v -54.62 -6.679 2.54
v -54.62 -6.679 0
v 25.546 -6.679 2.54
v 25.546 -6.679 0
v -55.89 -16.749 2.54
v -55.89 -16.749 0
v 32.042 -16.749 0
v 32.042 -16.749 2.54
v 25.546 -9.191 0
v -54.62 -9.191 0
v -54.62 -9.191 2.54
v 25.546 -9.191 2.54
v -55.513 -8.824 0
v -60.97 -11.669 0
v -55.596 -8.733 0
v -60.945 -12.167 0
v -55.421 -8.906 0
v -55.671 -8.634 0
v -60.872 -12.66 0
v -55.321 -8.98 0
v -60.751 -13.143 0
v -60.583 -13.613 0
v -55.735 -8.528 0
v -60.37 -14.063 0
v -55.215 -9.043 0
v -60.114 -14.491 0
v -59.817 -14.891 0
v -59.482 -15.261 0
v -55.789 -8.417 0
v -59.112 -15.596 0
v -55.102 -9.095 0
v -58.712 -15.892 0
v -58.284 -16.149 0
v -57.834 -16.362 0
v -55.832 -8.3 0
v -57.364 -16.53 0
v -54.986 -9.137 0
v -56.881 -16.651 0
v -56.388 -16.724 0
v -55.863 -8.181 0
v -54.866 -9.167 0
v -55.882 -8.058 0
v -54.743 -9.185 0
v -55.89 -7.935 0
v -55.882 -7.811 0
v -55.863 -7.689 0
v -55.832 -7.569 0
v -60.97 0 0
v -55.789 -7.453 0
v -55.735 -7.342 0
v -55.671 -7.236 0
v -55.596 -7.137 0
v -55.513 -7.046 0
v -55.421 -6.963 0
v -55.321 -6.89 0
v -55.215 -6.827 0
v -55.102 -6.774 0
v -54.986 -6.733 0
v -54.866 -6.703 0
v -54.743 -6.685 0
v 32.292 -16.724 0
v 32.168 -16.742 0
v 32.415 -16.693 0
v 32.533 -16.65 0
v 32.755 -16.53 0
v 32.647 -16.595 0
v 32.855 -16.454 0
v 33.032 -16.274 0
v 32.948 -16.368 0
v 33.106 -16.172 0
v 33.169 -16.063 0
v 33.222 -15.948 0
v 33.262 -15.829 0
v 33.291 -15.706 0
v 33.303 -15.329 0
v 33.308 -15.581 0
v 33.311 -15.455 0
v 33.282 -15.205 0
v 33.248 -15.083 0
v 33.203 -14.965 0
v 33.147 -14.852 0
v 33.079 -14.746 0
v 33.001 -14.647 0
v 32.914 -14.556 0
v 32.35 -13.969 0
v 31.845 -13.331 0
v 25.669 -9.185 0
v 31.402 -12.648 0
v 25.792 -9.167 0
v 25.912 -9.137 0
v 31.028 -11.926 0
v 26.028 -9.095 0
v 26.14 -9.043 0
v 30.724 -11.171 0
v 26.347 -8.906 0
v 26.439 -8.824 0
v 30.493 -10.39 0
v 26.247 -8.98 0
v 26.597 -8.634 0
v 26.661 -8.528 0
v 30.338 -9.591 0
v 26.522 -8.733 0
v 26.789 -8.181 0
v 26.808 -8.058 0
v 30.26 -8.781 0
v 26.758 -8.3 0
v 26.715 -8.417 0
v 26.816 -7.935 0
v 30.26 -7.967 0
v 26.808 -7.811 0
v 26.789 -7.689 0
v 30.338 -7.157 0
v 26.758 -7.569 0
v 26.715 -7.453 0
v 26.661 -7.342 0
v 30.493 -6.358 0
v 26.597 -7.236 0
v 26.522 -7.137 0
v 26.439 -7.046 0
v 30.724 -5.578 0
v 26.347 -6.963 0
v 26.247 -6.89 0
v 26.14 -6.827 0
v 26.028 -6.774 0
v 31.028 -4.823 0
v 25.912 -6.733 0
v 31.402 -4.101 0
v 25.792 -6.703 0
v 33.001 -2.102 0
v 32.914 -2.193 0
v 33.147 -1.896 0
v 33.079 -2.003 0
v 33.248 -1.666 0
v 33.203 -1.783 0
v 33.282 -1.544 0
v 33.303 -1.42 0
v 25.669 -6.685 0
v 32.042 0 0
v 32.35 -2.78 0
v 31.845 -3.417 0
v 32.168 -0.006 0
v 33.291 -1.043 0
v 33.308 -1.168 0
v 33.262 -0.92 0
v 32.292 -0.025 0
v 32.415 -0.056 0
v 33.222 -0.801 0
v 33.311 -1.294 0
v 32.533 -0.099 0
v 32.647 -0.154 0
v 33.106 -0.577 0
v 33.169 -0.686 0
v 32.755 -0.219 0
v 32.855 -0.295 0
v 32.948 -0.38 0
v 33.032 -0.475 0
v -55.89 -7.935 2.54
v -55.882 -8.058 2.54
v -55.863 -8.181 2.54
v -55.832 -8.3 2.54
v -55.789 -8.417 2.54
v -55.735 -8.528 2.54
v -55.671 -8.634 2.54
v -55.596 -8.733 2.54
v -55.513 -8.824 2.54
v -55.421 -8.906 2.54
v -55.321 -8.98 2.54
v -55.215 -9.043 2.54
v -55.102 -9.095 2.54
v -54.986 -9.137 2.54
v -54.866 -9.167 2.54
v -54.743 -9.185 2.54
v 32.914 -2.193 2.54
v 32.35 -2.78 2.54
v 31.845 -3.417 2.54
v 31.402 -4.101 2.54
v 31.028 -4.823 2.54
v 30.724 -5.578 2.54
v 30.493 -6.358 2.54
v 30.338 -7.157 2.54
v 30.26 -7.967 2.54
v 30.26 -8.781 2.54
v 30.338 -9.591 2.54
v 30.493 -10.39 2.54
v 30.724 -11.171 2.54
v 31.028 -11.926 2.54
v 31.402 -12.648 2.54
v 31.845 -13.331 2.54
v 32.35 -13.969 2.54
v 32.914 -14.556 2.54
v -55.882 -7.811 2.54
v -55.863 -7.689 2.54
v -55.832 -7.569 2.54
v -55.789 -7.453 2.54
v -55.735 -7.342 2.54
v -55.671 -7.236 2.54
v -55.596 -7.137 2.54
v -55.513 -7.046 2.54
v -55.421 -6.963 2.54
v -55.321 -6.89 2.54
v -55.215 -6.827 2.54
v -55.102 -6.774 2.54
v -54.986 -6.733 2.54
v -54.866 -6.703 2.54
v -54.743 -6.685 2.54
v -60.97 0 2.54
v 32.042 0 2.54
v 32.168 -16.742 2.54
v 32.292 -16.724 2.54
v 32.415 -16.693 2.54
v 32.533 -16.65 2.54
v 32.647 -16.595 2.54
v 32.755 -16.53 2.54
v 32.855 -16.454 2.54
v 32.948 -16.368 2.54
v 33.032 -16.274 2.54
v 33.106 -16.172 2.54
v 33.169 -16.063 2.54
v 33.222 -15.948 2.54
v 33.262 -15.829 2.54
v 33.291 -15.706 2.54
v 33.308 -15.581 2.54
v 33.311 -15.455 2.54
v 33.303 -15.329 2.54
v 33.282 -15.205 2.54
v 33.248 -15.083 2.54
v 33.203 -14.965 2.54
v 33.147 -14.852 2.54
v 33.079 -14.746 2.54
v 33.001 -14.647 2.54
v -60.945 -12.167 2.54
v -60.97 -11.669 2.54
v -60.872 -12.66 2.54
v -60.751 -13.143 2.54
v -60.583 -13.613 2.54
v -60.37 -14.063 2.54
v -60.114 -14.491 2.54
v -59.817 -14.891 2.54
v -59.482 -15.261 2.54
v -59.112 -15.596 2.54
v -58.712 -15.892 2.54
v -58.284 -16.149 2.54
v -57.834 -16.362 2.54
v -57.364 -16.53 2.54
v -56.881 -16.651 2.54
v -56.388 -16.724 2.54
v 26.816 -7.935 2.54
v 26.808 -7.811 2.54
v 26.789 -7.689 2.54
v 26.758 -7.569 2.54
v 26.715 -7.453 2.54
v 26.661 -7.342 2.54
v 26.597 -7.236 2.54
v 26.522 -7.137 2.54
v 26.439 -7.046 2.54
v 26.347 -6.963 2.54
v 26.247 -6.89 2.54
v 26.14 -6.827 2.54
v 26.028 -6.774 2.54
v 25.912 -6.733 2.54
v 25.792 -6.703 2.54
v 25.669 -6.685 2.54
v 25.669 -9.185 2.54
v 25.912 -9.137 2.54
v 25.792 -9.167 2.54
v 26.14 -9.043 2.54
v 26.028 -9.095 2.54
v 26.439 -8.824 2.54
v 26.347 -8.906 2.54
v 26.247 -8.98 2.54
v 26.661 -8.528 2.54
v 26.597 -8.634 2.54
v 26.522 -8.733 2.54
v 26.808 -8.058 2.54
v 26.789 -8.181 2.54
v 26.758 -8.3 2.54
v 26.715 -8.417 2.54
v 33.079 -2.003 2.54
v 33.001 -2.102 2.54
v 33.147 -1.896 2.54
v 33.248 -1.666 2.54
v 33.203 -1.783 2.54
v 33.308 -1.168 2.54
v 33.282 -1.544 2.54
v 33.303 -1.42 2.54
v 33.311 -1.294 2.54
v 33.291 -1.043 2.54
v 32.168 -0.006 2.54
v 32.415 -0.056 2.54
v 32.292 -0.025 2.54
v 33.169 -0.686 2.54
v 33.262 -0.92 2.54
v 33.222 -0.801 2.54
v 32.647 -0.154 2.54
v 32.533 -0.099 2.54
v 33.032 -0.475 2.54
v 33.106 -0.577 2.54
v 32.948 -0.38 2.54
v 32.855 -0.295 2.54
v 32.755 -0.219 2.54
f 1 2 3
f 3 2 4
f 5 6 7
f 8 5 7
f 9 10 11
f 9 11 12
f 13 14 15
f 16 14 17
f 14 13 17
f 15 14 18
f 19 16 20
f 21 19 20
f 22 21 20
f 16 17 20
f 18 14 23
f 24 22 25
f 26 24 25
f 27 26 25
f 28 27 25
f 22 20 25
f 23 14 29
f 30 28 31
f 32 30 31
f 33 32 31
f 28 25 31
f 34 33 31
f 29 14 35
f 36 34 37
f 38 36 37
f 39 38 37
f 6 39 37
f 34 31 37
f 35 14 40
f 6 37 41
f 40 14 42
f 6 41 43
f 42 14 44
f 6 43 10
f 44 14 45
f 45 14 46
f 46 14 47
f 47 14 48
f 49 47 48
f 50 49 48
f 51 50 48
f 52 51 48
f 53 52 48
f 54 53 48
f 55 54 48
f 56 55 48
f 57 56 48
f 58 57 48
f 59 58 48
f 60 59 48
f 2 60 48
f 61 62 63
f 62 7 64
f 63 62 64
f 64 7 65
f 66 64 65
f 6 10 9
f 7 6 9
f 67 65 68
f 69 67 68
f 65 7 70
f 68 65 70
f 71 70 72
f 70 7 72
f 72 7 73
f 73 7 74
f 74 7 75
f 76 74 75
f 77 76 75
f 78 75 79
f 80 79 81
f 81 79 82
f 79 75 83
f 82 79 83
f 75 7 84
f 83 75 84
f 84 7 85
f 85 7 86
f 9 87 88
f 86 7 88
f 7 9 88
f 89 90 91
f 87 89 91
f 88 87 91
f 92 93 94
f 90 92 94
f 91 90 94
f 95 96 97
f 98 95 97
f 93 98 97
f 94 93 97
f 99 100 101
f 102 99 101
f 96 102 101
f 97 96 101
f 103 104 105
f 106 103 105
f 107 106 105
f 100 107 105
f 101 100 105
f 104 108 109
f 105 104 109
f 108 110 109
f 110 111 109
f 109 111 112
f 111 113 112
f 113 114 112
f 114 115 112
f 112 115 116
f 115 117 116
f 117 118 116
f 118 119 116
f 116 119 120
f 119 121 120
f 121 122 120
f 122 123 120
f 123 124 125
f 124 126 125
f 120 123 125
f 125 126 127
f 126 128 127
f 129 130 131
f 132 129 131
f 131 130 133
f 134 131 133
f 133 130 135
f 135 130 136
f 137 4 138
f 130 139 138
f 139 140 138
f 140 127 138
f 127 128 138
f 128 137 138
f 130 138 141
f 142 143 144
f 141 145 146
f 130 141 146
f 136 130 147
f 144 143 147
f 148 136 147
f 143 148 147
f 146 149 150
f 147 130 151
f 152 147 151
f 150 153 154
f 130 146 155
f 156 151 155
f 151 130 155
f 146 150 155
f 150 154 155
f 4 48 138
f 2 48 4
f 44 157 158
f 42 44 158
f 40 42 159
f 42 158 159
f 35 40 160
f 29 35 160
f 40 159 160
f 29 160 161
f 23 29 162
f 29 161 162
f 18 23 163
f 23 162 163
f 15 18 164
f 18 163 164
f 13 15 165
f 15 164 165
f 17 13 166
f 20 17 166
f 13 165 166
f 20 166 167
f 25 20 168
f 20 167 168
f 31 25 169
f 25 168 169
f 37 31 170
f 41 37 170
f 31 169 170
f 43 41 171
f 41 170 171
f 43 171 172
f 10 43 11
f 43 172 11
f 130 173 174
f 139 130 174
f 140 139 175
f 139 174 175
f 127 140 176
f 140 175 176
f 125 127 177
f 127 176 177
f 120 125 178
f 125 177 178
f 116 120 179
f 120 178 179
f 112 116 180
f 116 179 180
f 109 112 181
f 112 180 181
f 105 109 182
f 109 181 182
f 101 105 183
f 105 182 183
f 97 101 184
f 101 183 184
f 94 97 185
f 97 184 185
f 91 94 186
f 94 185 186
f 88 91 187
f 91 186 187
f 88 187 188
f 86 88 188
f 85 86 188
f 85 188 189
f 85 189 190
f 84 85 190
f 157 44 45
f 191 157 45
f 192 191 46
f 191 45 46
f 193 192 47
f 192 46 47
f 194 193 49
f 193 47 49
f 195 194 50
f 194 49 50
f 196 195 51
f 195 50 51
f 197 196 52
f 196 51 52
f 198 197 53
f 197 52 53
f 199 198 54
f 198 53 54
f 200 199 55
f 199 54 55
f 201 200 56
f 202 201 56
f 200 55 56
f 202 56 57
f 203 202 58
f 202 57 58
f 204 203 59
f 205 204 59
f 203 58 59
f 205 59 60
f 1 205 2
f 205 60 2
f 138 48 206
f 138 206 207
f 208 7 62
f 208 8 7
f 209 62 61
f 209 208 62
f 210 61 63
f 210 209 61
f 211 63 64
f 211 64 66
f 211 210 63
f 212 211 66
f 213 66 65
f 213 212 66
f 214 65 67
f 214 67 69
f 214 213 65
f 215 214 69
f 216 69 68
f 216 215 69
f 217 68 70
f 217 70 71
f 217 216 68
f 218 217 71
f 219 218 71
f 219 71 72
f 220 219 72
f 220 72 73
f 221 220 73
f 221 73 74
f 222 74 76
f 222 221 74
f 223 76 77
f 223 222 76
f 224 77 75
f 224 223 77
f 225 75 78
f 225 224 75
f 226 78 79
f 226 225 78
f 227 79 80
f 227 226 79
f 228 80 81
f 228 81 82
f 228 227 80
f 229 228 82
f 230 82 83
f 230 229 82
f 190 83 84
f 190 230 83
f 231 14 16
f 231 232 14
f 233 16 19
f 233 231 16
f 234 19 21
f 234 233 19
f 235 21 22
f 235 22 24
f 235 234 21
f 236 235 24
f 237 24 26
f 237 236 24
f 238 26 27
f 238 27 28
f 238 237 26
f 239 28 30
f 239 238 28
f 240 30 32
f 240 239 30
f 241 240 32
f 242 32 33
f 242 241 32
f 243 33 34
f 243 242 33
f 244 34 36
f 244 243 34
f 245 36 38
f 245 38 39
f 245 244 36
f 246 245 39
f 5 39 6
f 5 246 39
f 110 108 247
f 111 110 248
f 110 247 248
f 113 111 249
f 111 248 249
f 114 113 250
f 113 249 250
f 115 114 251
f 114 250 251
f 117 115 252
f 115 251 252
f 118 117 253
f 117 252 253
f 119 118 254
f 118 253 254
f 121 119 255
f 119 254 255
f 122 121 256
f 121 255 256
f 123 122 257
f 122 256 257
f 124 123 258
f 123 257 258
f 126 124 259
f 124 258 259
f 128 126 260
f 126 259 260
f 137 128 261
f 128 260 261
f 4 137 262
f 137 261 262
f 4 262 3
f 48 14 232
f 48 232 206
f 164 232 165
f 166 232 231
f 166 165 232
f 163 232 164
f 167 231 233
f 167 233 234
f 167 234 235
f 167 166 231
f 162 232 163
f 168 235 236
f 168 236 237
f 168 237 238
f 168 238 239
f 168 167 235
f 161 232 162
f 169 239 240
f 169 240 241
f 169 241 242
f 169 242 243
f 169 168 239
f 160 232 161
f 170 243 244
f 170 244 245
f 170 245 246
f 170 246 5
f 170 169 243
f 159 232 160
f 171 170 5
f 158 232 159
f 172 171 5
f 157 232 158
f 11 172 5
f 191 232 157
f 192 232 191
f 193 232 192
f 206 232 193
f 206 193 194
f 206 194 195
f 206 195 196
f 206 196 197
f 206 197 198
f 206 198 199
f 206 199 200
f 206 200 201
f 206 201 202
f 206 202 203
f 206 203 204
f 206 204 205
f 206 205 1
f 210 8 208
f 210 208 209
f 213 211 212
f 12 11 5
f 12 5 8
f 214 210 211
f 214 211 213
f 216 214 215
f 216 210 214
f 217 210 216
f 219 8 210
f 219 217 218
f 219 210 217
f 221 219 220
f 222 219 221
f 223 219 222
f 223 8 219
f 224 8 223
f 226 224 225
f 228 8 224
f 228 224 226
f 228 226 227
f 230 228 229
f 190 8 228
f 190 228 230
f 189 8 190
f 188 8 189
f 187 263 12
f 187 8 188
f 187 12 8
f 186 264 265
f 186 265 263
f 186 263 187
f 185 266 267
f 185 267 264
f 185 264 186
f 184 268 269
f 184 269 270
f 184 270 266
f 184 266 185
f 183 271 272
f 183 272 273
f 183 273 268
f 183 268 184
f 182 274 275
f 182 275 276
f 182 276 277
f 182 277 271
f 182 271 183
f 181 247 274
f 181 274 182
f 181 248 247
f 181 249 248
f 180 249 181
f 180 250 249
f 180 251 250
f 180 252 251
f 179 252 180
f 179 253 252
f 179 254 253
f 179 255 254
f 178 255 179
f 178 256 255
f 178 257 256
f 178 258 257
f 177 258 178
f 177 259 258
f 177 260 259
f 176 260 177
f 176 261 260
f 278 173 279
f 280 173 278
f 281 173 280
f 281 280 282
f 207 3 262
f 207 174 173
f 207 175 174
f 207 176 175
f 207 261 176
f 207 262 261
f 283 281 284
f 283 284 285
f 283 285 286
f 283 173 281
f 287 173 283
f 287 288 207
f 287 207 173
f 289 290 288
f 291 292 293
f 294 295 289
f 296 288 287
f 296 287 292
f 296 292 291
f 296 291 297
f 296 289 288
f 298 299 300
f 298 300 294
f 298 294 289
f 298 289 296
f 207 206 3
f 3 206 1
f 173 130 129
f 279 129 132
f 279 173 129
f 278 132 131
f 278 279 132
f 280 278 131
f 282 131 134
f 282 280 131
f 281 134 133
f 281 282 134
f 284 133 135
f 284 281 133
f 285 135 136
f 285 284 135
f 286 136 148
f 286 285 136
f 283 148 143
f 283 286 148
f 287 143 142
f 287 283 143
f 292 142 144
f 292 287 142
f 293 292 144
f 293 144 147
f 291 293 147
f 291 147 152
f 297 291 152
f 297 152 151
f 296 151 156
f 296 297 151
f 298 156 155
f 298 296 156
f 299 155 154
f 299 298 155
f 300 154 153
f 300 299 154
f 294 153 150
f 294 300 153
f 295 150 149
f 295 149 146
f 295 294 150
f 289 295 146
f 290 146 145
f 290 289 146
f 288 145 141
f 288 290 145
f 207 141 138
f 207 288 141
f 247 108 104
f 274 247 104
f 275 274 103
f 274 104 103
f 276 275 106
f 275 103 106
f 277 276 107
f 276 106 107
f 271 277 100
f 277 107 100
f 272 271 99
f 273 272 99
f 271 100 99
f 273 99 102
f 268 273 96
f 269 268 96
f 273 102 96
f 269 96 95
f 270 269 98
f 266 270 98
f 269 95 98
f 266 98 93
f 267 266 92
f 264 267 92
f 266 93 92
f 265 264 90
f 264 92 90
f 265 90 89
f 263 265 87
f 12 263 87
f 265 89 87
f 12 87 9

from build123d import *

# Parameters (mm, degrees)
F0_W         = 99.7252352536
F0_H         = 16.7486164719
F1_DEPTH     = 2.54
F2_R         = 5.08
F3_R         = 8.5048235264
F4_DEPTH     = 2.54
F5_W         = 82.7053110433
F5_H         = 2.5119255297
F6_DEPTH     = 2.54
F7_R         = 1.27
F8_T1_DEPTH  = 2.54
F9_R         = 1.27
F10_T1_DEPTH = 2.54
F11_R        = 1.27
F12_R        = 1.27


# Not quite as in the source:
# - a fillet or chamfer that OpenCascade refuses, or shapes differently, is made with other operations: its cross-section is extruded or revolved along the edge and cut away or added


with BuildPart() as f1:
    # F0 (on Top) → F1 (new body)
    with BuildSketch(Plane.XY):
        with Locations((-11.1071113497, -8.3743082359)):
            Rectangle(F0_W, F0_H)
    extrude(amount=F1_DEPTH)

    # F2
    f2_edges = [f1.edges().sort_by_distance(p)[0] for p in [
        (-60.969729, -16.748616, 1.27),
    ]]
    fillet(f2_edges, radius=F2_R)

    # F3 (on face) → F4 (cut)
    with BuildSketch(Plane.XY.offset(2.54)):
        with Locations((38.7555062771, -8.3743082359)):
            Circle(F3_R)
    extrude(amount=-F4_DEPTH, mode=Mode.SUBTRACT)

    # F5 (on face) → F6 (cut)
    with BuildSketch(Plane(origin=(0, 0, 0), x_dir=(1, 0, 0), z_dir=(0, 0, -1))):
        with Locations((-14.5370734549, 7.9348592553)):
            Rectangle(F5_W, F5_H)
    extrude(amount=-F6_DEPTH, mode=Mode.SUBTRACT)

    # F7
    f7_edges = [f1.edges().sort_by_distance(p)[0] for p in [
        (-55.889729, -9.190822, 1.27),
    ]]
    fillet(f7_edges, radius=F7_R)

    # F8: fillet of radius 1.27 on 1 edges, made by hand

    # F8_s2 → F8_t1 (join)
    with BuildSketch(Plane.XY):
        with BuildLine():
            ThreePointArc((-55.8897289765, -7.9488964905), (-55.5177545886, -7.0508708784), (-54.6197289765, -6.6788964905))
            Line((-54.6197289765, -6.6788964905), (-55.8897289765, -6.6788964905))
            Line((-55.8897289765, -6.6788964905), (-55.8897289765, -7.9488964905))
        make_face()
    extrude(amount=F8_T1_DEPTH)

    # F9
    f9_edges = [f1.edges().sort_by_distance(p)[0] for p in [
        (26.815582, -6.678896, 1.27),
    ]]
    fillet(f9_edges, radius=F9_R)

    # F10: fillet of radius 1.27 on 1 edges, made by hand

    # F10_s2 → F10_t1 (join)
    with BuildSketch(Plane.XY):
        with BuildLine():
            ThreePointArc((26.8155820668, -7.9208220202), (26.4436076789, -8.8188476323), (25.5455820668, -9.1908220202))
            Line((25.5455820668, -9.1908220202), (26.8155820668, -9.1908220202))
            Line((26.8155820668, -9.1908220202), (26.8155820668, -7.9208220202))
        make_face()
    extrude(amount=F10_T1_DEPTH)

    # F11
    f11_edges = [f1.edges().sort_by_distance(p)[0] for p in [
        (37.271261, -16.748616, 1.27),
    ]]
    fillet(f11_edges, radius=F11_R)

    # F12
    f12_edges = [f1.edges().sort_by_distance(p)[0] for p in [
        (37.271261, 0, 1.27),
    ]]
    fillet(f12_edges, radius=F12_R)


solid = f1.part
